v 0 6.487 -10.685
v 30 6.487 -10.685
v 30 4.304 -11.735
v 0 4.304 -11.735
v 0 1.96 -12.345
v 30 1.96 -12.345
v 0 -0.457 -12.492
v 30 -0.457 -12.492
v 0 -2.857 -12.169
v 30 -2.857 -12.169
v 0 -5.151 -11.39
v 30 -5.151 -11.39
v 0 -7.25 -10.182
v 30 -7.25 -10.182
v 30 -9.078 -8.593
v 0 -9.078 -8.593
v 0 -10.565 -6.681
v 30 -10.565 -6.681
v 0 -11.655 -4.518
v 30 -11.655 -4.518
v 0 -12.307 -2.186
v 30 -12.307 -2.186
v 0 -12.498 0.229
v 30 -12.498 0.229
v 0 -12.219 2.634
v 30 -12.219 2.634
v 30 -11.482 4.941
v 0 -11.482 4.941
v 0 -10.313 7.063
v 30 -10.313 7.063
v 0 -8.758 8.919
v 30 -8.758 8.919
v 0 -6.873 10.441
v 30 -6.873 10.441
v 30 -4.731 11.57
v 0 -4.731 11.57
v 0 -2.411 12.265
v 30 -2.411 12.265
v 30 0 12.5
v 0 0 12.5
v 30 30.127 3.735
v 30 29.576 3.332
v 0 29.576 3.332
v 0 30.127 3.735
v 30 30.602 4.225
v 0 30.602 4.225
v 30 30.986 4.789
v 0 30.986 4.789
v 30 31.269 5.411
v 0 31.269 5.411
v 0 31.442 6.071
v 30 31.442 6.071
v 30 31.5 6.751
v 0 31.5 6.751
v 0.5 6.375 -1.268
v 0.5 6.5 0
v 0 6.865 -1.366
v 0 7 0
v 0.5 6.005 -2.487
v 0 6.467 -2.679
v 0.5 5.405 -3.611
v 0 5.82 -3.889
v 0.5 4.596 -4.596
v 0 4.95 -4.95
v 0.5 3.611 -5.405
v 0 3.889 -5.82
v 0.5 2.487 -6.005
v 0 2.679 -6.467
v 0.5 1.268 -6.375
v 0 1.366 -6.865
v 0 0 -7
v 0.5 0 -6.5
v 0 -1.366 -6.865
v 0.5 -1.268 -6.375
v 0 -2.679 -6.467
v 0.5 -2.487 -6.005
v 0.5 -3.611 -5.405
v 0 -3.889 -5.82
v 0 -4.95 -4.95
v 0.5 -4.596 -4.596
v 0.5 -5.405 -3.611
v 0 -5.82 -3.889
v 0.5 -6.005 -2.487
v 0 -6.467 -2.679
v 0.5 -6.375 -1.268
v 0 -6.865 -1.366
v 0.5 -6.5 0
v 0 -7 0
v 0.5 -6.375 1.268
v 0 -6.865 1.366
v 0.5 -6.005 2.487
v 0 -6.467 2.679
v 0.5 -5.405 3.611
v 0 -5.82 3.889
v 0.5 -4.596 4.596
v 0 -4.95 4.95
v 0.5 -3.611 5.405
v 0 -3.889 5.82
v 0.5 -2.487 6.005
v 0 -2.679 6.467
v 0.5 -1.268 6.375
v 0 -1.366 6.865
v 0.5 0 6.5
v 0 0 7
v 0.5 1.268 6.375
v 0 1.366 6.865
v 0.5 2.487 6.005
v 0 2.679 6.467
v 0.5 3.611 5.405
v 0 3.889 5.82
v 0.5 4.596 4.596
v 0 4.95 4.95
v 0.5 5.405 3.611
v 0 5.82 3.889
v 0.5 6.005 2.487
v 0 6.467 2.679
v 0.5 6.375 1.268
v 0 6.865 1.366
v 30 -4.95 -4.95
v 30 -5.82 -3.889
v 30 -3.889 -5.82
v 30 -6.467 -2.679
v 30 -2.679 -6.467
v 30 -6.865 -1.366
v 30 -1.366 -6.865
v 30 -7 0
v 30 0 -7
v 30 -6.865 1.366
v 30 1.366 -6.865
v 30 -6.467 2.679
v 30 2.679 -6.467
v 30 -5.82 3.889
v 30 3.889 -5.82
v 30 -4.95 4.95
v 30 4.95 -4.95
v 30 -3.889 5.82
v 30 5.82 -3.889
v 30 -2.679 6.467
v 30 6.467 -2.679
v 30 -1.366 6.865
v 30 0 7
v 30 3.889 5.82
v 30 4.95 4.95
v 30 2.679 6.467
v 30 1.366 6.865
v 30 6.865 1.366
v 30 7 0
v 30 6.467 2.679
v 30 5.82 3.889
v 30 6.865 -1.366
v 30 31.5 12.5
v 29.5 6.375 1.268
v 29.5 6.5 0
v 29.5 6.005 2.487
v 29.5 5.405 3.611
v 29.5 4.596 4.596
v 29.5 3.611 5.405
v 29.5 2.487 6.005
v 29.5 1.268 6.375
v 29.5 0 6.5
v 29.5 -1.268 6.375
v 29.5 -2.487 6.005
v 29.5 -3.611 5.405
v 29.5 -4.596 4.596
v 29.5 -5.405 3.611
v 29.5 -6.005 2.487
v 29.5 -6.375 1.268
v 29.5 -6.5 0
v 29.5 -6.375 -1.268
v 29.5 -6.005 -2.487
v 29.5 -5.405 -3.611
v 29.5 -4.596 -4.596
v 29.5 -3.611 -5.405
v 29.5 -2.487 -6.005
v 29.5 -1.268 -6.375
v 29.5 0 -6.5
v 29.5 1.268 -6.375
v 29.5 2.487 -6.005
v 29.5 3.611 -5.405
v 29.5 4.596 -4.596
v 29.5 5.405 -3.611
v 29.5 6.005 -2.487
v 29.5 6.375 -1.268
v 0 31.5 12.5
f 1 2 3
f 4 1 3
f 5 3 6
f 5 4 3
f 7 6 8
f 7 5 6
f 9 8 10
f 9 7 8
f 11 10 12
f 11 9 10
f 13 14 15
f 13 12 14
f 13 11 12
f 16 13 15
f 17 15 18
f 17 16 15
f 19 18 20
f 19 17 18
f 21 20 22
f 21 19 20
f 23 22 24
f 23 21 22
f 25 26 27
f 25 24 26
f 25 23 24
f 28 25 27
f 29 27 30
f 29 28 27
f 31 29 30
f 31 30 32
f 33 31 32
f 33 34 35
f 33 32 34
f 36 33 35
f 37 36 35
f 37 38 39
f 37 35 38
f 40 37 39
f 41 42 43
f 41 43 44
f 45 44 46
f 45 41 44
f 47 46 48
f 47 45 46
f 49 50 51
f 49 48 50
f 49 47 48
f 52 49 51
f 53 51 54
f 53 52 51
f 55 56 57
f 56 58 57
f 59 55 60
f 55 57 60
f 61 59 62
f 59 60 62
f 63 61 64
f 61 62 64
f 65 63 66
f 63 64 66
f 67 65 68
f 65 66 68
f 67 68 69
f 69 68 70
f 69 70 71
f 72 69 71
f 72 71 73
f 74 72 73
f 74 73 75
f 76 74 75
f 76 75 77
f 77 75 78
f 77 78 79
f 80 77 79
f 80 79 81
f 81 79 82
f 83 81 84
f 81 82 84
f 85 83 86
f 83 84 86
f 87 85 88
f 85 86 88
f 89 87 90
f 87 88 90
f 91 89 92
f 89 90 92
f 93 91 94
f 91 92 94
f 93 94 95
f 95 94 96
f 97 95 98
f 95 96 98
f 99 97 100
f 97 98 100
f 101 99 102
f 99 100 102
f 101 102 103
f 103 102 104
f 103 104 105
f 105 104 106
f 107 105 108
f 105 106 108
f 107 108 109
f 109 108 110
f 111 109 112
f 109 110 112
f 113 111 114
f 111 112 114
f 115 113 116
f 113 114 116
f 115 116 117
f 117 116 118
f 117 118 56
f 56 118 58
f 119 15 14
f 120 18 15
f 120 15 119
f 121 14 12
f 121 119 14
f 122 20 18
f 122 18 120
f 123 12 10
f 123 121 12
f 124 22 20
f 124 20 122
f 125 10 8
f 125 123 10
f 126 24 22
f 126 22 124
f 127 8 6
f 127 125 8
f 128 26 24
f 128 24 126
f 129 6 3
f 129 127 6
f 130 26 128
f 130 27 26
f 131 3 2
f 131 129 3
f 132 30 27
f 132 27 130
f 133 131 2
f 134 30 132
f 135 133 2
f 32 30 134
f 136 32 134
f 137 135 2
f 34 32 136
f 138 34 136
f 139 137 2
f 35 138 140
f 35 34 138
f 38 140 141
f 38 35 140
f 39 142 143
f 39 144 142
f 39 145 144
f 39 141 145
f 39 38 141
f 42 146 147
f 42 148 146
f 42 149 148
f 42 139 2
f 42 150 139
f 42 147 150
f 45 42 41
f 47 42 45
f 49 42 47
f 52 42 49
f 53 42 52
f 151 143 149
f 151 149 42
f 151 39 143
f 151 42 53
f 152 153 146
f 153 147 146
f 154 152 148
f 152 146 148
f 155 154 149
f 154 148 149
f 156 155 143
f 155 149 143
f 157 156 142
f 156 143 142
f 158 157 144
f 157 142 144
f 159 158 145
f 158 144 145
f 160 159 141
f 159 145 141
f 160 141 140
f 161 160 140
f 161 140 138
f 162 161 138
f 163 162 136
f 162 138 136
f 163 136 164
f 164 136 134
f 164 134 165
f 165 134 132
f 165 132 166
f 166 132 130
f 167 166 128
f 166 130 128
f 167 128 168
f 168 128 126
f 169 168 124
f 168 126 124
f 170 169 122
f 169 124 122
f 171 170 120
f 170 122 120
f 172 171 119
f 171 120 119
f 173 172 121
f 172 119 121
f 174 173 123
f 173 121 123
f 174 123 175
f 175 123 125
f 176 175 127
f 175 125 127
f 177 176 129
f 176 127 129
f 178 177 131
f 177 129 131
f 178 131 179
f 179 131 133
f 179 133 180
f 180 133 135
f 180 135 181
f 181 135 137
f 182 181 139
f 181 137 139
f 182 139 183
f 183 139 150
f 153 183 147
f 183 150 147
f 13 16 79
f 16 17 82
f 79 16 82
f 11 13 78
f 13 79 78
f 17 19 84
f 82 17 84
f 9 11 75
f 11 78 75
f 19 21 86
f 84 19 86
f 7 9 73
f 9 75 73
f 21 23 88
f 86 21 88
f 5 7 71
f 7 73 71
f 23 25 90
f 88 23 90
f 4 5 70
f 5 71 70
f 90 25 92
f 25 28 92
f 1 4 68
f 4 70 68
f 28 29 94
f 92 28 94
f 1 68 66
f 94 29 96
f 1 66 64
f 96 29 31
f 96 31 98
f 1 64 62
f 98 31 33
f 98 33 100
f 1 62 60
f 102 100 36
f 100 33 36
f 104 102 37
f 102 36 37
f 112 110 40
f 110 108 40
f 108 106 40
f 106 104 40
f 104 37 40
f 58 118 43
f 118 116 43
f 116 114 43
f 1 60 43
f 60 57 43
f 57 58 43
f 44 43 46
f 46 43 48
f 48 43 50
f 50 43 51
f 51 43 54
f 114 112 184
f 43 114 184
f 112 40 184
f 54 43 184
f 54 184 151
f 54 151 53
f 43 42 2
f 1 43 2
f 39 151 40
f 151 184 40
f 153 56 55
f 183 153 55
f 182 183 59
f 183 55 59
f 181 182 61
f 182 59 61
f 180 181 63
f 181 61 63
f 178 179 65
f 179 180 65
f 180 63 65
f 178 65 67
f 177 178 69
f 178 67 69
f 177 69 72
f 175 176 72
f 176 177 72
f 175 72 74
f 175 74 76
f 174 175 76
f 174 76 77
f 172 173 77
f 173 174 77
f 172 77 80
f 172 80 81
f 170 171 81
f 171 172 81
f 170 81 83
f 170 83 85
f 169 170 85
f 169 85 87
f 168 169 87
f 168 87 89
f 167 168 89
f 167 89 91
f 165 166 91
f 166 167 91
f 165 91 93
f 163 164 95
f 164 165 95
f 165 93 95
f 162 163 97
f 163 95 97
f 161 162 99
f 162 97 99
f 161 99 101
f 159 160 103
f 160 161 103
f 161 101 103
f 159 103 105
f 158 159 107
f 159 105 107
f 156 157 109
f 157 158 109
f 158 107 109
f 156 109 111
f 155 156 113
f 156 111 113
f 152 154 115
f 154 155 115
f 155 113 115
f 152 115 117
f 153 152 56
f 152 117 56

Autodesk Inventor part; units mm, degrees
ref_plane "YZ Plane" through (0, 0, 0) normal (1, 0, 0) x (0, 1, 0)
ref_plane "XZ Plane" through (0, 0, 0) normal (0, 1, 0) x (-1, 0, 0)
ref_plane "XY Plane" through (0, 0, 0) normal (0, 0, 1) x (1, 0, 0)
sketch "Náčrt2" plane through (0, 0, 0) normal (1, 0, 0) x (0, 1, 0)
  circle A0 centre (0, 0) radius 6.5
  line L0 (31.5, 12.5) -> (0, 12.5)
  line L1 (31.5, 12.5) -> (31.5, 4.5)
  line L2 (31.5, 4.5) -> (6.4868, -10.6851)
  arc A1 (0, 12.5) -> (6.4868, -10.6851) centre (0, 0) ccw
  dimension "d0" = 13
  dimension "d1" = 6
  dimension "d2" = 31.5
  dimension "d3" = 8
extrude "Vysunutí1" add sketch "Náčrt2" along normal blind 30
fillet "Zaoblení1" radius 4 1 edges at (15, 31.5, 4.5)
chamfer "Zkosení1" distance 0.5 angle 45 2 edges at (0, -6.5, 0) (30, -6.5, 0)
properties part number "DD_KVD_003_10_A" material "Nerezová ocel"
